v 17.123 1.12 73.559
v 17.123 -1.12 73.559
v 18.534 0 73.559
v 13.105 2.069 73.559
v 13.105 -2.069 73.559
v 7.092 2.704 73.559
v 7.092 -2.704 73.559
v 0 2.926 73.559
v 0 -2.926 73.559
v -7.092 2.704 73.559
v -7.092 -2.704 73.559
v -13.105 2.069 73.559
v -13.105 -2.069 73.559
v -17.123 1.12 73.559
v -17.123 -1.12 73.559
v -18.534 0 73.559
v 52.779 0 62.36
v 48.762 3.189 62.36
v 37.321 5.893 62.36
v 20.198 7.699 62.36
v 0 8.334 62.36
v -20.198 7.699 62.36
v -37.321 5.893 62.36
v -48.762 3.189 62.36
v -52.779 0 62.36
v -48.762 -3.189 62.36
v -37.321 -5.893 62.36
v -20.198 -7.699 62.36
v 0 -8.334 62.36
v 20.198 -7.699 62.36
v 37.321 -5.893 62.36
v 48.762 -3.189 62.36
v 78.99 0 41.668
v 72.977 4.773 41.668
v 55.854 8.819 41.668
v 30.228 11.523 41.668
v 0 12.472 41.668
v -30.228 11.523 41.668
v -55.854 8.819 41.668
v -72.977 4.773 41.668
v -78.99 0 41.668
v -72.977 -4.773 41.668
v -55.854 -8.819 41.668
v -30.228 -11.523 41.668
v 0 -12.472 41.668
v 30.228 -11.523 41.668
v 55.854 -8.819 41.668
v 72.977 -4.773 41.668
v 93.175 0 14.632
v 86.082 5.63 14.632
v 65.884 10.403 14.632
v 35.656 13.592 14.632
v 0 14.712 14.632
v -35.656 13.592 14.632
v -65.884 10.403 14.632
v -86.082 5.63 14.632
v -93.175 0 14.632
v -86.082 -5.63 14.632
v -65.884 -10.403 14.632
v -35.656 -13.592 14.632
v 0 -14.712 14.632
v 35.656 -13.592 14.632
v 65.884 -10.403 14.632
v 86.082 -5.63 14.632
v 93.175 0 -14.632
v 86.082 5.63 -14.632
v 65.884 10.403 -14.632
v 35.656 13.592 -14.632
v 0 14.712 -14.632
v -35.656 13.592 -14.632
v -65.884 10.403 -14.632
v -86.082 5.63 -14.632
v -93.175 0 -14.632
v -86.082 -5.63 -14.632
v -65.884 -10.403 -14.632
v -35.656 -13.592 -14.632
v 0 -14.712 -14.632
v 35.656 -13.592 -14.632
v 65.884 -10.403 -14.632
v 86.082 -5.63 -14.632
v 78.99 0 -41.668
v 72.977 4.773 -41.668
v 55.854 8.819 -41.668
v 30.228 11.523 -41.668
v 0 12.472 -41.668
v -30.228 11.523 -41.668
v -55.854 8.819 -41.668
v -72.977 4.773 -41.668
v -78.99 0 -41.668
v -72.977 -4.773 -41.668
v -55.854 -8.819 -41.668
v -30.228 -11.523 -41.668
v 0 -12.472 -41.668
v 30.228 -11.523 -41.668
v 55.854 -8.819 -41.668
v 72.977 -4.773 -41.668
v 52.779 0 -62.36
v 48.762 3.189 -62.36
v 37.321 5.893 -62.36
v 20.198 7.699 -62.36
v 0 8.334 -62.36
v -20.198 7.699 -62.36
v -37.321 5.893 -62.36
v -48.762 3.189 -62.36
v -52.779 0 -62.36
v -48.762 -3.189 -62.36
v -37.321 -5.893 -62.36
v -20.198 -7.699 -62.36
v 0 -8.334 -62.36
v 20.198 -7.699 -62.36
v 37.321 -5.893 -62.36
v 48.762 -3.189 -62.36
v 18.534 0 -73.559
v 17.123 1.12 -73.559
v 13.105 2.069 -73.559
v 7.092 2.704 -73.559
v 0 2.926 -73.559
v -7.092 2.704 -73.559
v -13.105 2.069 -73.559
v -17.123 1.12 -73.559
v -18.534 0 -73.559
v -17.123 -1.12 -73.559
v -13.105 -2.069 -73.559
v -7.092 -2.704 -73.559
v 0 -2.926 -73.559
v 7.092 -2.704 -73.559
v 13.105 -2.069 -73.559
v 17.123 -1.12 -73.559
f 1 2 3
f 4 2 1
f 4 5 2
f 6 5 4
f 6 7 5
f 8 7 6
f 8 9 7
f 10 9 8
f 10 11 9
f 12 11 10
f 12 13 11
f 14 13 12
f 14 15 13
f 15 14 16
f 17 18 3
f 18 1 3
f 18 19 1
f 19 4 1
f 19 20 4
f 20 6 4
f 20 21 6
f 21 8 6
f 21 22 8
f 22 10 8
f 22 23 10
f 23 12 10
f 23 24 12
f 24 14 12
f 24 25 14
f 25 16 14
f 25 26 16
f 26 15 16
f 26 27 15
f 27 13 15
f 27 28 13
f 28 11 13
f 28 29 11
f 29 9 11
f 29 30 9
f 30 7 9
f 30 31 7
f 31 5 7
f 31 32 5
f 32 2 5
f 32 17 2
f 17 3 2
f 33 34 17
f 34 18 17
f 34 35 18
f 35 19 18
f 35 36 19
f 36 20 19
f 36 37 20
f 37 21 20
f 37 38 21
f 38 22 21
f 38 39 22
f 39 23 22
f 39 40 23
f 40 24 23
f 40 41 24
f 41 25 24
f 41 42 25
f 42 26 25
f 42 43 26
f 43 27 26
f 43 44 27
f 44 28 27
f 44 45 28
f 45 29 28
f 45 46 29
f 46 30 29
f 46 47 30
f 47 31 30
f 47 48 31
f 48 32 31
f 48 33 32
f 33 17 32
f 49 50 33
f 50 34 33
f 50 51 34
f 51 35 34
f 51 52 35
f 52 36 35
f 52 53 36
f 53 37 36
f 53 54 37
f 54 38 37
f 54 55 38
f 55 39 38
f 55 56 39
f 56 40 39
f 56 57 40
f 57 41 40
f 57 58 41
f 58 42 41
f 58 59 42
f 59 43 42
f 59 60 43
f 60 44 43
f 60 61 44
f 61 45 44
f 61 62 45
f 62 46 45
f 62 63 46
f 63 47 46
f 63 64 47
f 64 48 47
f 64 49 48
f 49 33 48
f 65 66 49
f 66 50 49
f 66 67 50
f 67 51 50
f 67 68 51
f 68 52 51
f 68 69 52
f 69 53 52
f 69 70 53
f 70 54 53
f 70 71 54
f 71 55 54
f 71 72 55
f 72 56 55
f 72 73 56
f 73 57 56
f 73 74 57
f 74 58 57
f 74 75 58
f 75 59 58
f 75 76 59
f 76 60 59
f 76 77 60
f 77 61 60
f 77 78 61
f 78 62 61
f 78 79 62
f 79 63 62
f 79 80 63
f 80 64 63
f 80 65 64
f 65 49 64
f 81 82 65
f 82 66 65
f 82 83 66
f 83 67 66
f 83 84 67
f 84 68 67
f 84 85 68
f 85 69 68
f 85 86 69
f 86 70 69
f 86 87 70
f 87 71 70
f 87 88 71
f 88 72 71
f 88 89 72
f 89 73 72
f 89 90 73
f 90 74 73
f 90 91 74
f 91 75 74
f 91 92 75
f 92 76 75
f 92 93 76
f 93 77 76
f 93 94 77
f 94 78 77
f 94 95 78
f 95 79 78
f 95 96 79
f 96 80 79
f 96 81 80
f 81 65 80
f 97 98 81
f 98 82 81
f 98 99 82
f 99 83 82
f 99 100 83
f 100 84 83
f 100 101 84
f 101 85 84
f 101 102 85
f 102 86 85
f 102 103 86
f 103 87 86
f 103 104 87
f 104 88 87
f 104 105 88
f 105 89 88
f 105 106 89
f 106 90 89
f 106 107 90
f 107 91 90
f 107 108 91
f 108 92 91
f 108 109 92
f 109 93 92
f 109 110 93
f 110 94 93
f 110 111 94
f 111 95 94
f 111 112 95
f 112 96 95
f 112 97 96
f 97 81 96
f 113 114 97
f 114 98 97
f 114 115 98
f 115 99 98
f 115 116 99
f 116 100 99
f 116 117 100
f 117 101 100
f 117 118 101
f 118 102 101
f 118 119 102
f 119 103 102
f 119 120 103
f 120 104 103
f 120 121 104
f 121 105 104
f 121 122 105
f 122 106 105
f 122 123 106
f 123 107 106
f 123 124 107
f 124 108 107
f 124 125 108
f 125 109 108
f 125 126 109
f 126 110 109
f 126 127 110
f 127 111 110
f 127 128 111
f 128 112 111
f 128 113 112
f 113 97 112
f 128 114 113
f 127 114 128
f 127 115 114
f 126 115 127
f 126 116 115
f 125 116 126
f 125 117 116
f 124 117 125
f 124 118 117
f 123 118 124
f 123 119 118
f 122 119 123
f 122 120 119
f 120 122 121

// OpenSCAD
// Generated by SolidPython 1.0.1 on 2020-07-29 00:46:53


scale(v = [19, 3, 15]) {
	sphere(r = 5);
}
/***********************************************
*********      SolidPython code:      **********
************************************************
 
# import packages: SolidPython
from solid import *
from solid.utils import *
from itertools import chain, combinations, permutations


class Resize:

    def __init__(self, scad_file):
        self.scad_file = scad_file
        #self.scad_file = import_scad(scad_file)
        # cone/cylinder param:
        self.r1 = 0
        self.r2 = 0
        self.h = 0
        # rectangular prism param:
        self.w = 0
        self.l = 0
        # ellipse param:
        self.r = 0

    # import OpenScad code (file name corresponds to shape)


    # classify shape + parameters
    def assign(self, param1, param2, param3):
        if self.scad_file == 'cone.scad':
            self.r1 = param1
            self.r2 = param2
            self.h = param3
        elif self.scad_file == 'cylinder.scad':
            self.r1 = param1
            self.r2 = param2
            self.h = param3
        elif self.scad_file == 'rectangularPrism.scad':
            self.h = param1
            self.l = param2
            self.w = param3
        else:
            self.r = param1
            self.h = param2

    # resize parameters
    def iterate(self):
        x = range(3, 20, 2)
        i = 1
        if self.scad_file == 'cone.scad':
            tempList = list(permutations(x, 2))
            for temp in tempList:
                param1 = temp[0]
                param2 = temp[1]
                filepath = 'produced_scad_files/' + 'cone' + str(param1) + '_' + str(param2) + '_' + '.scad'
                scad_render_to_file(cylinder(h=param1, r1=param2, r2=0), filepath)

        elif self.scad_file == 'cylinder.scad':
            tempList = list(permutations(x, 3))
            for temp in tempList:
                param1 = temp[0]
                param2 = temp[1]
                filepath = 'produced_scad_files/' + 'cylinder' + str(param1) + '_' + str(param2) + '_' + '.scad'
                scad_render_to_file(cylinder(h=param1, r1=param2, r2=param2), filepath)

        elif self.scad_file == 'rectangularPrism.scad':
            tempList = list(permutations(x, 3))
            for temp in tempList:
                param1 = temp[0]
                param2 = temp[1]
                param3 = temp[2]
                filepath = 'produced_scad_files/' + 'rectangularPrism' + str(param1) + '_' + str(param2) + '_' + str(
                    param3) + '.scad'
                scad_render_to_file(cube(size=(param1, param2, param3)), filepath)

        elif self.scad_file == 'ellipse.scad':
            tempList = list(permutations(x, 4))
            for temp in tempList:
                param1 = temp[0]
                param2 = temp[1]
                param3 = temp[2]
                param4 = temp[3]
                filepath = 'produced_scad_files/' + 'ellipse' + str(param1) + '_' + str(param2) + '_' + str(param3) + '_' + str(param4) + '.scad'
                scad_render_to_file(scale([param1, param2, param3])(sphere(r=param4)), filepath)

    def render_to_scadfile(self):
        scad_render_to_file(scad, 'example.scad') 
 
************************************************/
